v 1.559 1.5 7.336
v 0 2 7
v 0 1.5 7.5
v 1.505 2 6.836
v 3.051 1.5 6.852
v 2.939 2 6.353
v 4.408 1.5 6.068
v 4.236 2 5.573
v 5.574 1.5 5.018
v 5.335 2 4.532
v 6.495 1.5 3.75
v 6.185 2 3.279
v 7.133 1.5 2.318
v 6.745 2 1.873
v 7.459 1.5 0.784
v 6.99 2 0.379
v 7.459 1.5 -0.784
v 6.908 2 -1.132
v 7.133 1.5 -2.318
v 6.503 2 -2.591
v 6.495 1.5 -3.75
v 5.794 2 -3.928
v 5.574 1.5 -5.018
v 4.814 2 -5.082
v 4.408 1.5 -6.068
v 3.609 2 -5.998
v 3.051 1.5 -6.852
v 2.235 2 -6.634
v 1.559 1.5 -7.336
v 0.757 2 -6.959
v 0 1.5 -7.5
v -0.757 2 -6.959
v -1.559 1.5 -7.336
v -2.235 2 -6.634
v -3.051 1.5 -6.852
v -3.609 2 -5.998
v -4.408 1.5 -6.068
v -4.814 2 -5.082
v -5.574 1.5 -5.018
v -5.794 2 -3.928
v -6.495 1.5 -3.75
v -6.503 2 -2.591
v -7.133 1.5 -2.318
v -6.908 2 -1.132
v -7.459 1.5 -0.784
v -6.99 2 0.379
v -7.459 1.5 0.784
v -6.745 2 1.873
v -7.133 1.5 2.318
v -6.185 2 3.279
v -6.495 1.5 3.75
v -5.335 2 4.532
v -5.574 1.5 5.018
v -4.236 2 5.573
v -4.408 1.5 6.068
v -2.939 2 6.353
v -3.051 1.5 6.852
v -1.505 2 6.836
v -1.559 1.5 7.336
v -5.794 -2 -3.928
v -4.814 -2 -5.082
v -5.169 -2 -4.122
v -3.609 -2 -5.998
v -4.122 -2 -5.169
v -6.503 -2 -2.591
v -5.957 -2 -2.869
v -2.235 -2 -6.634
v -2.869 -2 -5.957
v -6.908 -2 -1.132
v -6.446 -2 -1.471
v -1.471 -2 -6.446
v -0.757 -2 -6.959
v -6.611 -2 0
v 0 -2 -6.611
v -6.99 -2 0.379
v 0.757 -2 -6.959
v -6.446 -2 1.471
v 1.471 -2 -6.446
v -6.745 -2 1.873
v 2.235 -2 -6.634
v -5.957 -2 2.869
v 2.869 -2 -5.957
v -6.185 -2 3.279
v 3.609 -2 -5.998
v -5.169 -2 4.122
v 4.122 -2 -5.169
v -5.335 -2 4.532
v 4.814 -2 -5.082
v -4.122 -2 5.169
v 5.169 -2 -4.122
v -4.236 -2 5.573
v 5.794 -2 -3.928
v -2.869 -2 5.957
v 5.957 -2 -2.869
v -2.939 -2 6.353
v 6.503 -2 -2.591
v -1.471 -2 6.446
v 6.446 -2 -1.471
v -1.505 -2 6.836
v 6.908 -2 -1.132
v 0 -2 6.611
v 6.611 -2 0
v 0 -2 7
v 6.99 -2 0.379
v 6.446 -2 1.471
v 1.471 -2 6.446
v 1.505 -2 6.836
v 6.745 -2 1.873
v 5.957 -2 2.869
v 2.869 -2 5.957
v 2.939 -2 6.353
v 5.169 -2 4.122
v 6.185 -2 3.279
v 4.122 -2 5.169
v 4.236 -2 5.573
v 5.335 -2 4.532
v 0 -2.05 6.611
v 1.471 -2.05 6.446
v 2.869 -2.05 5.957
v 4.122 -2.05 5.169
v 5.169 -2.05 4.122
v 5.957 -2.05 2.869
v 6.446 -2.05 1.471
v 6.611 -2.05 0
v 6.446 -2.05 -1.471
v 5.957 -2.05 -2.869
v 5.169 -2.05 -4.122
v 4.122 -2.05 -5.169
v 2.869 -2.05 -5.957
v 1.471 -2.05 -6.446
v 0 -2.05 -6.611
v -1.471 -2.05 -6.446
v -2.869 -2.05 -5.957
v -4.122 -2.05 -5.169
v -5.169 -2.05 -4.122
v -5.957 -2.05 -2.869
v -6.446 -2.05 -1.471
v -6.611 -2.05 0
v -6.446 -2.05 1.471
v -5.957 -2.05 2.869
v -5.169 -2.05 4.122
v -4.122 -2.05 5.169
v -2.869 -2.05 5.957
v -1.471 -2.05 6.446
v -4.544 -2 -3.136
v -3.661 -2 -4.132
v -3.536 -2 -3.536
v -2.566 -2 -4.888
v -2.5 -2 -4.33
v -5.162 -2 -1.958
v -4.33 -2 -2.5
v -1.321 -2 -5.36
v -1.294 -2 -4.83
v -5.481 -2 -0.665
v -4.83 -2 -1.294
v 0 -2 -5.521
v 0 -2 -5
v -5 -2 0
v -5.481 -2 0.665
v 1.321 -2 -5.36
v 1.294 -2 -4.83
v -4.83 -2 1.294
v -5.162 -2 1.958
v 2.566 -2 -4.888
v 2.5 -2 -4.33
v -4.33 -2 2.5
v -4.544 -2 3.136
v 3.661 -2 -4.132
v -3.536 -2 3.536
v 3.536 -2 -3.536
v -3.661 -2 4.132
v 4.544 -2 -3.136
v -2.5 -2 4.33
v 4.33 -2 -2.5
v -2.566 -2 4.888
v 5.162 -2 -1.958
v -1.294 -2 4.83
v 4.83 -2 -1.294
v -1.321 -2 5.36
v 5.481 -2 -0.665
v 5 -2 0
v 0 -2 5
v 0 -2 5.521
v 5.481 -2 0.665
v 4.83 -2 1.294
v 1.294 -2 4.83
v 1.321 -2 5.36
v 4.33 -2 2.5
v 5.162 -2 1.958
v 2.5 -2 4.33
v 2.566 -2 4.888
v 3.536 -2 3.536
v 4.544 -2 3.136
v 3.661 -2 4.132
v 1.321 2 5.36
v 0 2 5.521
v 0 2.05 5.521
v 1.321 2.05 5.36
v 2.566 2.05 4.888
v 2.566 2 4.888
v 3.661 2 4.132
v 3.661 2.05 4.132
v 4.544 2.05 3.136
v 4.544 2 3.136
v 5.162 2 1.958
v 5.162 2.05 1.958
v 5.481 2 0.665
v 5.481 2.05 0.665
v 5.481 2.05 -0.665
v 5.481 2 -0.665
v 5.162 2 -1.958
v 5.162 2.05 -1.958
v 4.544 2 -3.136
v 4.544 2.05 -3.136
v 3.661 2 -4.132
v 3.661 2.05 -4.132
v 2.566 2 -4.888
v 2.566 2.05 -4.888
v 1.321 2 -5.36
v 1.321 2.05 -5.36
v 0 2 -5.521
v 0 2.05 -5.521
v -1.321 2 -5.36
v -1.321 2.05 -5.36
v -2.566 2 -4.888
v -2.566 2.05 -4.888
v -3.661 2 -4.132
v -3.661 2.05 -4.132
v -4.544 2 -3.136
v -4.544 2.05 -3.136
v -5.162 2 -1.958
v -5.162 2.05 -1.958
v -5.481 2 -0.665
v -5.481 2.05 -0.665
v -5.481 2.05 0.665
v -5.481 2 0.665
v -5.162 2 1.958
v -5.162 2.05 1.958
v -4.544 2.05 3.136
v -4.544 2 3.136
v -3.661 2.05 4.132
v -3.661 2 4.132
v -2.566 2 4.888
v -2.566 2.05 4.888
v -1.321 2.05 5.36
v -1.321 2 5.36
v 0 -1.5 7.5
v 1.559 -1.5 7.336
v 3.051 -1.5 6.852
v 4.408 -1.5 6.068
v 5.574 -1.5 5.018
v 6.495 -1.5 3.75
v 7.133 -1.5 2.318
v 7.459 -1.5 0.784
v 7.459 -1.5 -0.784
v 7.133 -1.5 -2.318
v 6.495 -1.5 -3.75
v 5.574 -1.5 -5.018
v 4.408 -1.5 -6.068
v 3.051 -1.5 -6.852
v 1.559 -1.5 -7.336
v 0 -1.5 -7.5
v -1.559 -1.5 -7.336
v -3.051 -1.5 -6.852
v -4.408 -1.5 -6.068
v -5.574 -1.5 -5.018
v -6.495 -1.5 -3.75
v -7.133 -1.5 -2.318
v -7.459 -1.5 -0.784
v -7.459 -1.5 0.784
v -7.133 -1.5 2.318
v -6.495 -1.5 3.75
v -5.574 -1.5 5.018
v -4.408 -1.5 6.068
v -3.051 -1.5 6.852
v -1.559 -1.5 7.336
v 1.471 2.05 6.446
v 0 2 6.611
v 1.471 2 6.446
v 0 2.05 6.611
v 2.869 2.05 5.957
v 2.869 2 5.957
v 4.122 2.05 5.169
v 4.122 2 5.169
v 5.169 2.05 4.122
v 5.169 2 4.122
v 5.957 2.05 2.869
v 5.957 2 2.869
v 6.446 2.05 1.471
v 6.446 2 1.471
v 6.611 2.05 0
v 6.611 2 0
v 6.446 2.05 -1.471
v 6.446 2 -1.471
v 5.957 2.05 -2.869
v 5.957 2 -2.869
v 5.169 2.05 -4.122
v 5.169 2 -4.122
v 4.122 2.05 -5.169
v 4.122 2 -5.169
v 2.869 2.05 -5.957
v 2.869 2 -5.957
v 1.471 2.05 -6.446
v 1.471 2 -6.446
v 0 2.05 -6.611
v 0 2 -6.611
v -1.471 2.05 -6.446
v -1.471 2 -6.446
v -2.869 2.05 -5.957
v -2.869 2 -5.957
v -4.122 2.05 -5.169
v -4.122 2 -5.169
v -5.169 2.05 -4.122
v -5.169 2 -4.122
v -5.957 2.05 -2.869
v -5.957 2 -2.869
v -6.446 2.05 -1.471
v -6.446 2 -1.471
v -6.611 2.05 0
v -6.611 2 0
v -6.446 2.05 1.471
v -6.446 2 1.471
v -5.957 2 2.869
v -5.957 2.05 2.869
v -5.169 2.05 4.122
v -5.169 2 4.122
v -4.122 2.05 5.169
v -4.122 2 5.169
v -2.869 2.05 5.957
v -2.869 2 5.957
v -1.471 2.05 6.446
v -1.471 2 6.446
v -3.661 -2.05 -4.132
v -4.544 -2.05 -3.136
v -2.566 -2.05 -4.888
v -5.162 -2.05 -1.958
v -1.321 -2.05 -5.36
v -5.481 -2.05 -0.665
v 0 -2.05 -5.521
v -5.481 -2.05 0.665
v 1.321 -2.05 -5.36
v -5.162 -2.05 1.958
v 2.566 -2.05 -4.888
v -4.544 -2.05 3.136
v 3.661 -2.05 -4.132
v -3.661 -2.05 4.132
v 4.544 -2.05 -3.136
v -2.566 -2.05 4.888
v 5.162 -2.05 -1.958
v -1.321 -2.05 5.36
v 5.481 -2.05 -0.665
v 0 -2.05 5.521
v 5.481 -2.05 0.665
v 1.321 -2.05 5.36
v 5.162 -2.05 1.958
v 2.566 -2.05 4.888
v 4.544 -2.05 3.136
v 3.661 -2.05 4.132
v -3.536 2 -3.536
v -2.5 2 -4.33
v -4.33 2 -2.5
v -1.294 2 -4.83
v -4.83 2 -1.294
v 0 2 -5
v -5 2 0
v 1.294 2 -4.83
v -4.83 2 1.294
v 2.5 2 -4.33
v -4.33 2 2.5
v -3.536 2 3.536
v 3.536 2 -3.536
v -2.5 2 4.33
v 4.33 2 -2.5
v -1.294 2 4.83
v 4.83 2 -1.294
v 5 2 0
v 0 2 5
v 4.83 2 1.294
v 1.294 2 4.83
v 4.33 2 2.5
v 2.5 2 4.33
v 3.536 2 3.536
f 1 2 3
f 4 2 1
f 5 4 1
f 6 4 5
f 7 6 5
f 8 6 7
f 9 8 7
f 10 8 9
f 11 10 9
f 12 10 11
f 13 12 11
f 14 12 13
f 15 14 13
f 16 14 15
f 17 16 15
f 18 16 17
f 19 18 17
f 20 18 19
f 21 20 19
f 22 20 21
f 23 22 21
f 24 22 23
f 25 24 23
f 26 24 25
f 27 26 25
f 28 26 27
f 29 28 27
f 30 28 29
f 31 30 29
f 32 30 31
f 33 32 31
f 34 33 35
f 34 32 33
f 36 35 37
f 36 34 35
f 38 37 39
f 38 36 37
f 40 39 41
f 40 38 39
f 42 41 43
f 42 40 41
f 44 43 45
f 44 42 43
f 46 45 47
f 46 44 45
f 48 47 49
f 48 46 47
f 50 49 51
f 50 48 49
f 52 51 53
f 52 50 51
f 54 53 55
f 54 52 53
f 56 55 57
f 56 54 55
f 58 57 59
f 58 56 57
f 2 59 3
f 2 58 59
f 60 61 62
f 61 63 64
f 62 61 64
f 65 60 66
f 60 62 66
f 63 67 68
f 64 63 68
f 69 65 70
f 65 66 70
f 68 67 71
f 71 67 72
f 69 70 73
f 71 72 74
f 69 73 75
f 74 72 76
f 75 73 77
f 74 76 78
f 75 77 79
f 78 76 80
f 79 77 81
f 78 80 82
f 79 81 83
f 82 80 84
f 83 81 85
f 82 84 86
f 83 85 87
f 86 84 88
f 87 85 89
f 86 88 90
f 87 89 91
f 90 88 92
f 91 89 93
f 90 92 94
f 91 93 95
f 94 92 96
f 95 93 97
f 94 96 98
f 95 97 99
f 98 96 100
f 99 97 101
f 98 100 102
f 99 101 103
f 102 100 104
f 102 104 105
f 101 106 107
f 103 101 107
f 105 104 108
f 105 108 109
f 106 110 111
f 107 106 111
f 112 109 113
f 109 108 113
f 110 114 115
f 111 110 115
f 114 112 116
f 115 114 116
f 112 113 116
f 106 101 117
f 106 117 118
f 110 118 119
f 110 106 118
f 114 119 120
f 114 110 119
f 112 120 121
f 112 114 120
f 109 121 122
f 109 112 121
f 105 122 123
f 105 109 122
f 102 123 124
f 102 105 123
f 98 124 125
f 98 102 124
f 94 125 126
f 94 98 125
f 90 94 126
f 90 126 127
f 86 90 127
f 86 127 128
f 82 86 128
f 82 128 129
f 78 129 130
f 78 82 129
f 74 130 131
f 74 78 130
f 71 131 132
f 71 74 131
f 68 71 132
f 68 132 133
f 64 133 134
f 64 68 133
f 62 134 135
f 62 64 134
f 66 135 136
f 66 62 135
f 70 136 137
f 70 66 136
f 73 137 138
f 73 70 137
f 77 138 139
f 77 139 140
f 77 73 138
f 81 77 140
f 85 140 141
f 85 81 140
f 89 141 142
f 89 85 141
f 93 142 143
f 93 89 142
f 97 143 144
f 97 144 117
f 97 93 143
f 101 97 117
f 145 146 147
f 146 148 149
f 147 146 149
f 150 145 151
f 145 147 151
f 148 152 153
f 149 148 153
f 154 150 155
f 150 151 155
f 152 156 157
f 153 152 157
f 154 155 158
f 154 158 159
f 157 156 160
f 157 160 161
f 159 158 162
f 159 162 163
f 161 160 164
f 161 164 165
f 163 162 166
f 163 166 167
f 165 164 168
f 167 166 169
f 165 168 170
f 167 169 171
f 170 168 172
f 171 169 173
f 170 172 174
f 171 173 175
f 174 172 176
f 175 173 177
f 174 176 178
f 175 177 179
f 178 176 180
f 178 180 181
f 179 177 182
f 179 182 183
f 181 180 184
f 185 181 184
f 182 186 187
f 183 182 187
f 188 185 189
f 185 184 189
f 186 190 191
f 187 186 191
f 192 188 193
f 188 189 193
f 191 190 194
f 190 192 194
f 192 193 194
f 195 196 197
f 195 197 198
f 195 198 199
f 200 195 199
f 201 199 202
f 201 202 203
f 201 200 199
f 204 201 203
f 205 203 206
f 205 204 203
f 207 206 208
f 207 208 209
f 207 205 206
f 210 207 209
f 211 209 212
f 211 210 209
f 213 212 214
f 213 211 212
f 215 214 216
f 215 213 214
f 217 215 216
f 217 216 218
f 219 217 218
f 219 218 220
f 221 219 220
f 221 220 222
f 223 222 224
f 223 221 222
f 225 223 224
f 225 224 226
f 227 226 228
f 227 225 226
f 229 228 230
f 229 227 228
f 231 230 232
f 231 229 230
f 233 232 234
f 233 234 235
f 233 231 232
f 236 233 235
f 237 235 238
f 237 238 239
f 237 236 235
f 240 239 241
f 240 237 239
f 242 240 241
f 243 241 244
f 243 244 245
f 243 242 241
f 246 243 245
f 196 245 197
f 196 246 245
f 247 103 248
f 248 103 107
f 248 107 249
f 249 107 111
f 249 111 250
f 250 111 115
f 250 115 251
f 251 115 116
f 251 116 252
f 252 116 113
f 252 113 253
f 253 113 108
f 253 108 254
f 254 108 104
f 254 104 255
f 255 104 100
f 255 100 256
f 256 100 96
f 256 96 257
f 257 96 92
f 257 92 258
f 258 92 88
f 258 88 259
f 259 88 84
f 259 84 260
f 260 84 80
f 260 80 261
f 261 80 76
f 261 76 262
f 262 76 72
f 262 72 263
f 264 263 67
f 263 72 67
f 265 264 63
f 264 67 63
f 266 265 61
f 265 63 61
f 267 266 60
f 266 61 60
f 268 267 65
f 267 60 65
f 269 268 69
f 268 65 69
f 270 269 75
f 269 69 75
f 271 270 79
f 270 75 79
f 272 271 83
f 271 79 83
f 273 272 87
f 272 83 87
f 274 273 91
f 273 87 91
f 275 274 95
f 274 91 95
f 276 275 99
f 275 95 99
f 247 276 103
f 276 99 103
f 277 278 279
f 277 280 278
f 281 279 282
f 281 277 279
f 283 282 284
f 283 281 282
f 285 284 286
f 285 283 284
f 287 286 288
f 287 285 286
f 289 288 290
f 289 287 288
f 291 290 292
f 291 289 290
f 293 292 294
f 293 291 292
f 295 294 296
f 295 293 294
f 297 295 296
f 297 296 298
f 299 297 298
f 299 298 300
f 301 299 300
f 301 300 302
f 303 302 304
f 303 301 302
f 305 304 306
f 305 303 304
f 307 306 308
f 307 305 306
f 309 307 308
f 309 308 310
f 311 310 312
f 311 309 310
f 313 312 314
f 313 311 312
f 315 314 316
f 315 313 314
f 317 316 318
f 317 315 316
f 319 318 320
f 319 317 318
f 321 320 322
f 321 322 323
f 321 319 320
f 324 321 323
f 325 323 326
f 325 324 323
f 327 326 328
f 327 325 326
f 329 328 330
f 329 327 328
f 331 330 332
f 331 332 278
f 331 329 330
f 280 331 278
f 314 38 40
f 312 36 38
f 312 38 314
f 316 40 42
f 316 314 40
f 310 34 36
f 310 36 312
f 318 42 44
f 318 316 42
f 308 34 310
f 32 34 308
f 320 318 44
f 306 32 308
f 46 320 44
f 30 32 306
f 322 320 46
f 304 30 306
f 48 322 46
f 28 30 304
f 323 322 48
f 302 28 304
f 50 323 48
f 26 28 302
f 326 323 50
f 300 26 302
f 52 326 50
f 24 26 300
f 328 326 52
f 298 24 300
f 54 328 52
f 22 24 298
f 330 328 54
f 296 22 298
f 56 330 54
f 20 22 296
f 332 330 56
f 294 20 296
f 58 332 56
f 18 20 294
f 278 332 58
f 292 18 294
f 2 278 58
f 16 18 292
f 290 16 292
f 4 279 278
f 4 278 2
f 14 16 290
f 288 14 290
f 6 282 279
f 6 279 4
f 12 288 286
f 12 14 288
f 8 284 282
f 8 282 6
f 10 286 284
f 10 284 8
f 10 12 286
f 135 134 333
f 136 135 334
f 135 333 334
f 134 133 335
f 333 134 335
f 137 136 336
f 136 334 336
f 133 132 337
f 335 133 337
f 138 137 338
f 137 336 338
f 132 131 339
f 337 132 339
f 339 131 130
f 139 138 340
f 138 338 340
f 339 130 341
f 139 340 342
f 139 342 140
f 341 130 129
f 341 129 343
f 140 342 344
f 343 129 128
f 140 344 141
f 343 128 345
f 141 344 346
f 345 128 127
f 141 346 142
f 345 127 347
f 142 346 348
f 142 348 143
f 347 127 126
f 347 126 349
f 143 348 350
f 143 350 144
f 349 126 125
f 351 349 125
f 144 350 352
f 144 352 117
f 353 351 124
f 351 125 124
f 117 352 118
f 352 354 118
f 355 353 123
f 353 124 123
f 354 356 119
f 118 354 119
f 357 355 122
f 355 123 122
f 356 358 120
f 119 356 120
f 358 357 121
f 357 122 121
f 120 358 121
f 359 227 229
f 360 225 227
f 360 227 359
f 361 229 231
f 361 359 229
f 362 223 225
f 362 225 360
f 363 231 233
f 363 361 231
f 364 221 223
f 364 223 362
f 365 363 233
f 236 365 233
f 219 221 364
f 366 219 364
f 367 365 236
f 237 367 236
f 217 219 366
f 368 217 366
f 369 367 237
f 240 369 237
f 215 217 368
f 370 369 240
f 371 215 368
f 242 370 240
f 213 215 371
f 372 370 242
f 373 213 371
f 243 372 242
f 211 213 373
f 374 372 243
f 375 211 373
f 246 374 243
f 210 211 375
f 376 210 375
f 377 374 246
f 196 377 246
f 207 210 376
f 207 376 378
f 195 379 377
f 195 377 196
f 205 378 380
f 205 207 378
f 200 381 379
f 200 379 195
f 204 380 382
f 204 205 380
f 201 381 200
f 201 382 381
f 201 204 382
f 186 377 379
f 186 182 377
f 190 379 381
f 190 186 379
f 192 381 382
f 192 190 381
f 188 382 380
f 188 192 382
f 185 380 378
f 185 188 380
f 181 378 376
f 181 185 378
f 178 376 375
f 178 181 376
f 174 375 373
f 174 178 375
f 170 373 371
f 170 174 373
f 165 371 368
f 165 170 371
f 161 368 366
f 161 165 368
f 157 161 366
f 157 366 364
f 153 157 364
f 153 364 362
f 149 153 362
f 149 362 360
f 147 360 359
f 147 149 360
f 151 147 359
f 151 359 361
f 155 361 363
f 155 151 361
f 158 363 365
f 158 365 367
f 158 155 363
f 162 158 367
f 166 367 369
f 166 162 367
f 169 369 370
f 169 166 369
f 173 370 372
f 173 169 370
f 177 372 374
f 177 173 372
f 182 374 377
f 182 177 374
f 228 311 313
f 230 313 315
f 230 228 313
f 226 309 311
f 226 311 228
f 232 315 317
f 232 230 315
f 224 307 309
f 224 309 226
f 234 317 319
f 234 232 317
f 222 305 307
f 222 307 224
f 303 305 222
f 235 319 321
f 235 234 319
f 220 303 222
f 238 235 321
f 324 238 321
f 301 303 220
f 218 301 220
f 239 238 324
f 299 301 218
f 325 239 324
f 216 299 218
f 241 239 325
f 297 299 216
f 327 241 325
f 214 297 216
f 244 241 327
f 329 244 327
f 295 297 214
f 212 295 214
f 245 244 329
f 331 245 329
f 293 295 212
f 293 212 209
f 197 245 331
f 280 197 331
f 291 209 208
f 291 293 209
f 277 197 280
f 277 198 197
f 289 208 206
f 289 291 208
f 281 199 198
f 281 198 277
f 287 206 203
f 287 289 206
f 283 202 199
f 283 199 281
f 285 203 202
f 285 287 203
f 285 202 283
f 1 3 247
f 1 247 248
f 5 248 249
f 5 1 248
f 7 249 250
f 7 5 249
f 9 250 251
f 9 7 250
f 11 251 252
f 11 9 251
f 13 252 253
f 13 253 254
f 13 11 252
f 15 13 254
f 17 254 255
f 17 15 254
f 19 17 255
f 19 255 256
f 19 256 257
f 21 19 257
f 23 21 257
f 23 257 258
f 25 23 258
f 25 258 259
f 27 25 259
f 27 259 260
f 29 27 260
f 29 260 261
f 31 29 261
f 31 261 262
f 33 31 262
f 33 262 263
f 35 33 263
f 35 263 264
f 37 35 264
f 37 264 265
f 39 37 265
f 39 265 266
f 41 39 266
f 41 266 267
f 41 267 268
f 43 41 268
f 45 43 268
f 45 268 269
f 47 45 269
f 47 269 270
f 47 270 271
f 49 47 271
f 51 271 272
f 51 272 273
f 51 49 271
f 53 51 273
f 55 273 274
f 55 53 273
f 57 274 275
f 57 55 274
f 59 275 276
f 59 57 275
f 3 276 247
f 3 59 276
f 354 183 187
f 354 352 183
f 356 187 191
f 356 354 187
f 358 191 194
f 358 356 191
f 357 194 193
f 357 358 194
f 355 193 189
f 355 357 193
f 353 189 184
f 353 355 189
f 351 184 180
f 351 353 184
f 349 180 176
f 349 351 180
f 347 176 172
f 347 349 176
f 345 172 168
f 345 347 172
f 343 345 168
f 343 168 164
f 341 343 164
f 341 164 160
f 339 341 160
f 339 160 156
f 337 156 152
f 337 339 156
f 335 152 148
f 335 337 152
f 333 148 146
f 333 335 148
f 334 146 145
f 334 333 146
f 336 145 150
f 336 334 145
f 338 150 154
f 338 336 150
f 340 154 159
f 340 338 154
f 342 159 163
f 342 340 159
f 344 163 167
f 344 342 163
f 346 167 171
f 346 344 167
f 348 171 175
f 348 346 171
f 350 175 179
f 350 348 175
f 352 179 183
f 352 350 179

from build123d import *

# Parameters (mm, degrees)
CROQUIS1_R              = 7.5
CROQUIS1_R_2            = 5
SALIENTE_EXTRUIR1_DEPTH = 2
CHAFL_N1_SIZE           = 0.5
CROQUIS2_R              = 6.611271869
CROQUIS2_R_2            = 5.520857639
SALIENTE_EXTRUIR2_DEPTH = 2.05


with BuildPart() as part:
    # Croquis1 → Saliente-Extruir1 (new, symmetric)
    with BuildSketch(Plane(origin=(0, 0, 0), x_dir=(1, 0, 0), z_dir=(0, 1, 0))):
        with Locations(Location((0, 0, 0), (0, 0, 270))):
            Circle(CROQUIS1_R)
        with Locations(Location((0, 0, 0), (0, 0, 270))):
            Circle(CROQUIS1_R_2, mode=Mode.SUBTRACT)
    extrude(amount=SALIENTE_EXTRUIR1_DEPTH, both=True)

    # Chaflán1
    chafl_n1_edges = [part.edges().sort_by_distance(p)[0] for p in [
        (0, -2, -7.5),
        (0, 2, -7.5),
    ]]
    chamfer(chafl_n1_edges, length=CHAFL_N1_SIZE)

    # Croquis2 → Saliente-Extruir2 (add, symmetric)
    with BuildSketch(Plane(origin=(0, 0, 0), x_dir=(1, 0, 0), z_dir=(0, 1, 0))):
        with Locations(Location((0, 0, 0), (0, 0, 270))):
            Circle(CROQUIS2_R)
        with Locations(Location((0, 0, 0), (0, 0, 270))):
            Circle(CROQUIS2_R_2, mode=Mode.SUBTRACT)
    extrude(amount=SALIENTE_EXTRUIR2_DEPTH, both=True)


solid = part.part
